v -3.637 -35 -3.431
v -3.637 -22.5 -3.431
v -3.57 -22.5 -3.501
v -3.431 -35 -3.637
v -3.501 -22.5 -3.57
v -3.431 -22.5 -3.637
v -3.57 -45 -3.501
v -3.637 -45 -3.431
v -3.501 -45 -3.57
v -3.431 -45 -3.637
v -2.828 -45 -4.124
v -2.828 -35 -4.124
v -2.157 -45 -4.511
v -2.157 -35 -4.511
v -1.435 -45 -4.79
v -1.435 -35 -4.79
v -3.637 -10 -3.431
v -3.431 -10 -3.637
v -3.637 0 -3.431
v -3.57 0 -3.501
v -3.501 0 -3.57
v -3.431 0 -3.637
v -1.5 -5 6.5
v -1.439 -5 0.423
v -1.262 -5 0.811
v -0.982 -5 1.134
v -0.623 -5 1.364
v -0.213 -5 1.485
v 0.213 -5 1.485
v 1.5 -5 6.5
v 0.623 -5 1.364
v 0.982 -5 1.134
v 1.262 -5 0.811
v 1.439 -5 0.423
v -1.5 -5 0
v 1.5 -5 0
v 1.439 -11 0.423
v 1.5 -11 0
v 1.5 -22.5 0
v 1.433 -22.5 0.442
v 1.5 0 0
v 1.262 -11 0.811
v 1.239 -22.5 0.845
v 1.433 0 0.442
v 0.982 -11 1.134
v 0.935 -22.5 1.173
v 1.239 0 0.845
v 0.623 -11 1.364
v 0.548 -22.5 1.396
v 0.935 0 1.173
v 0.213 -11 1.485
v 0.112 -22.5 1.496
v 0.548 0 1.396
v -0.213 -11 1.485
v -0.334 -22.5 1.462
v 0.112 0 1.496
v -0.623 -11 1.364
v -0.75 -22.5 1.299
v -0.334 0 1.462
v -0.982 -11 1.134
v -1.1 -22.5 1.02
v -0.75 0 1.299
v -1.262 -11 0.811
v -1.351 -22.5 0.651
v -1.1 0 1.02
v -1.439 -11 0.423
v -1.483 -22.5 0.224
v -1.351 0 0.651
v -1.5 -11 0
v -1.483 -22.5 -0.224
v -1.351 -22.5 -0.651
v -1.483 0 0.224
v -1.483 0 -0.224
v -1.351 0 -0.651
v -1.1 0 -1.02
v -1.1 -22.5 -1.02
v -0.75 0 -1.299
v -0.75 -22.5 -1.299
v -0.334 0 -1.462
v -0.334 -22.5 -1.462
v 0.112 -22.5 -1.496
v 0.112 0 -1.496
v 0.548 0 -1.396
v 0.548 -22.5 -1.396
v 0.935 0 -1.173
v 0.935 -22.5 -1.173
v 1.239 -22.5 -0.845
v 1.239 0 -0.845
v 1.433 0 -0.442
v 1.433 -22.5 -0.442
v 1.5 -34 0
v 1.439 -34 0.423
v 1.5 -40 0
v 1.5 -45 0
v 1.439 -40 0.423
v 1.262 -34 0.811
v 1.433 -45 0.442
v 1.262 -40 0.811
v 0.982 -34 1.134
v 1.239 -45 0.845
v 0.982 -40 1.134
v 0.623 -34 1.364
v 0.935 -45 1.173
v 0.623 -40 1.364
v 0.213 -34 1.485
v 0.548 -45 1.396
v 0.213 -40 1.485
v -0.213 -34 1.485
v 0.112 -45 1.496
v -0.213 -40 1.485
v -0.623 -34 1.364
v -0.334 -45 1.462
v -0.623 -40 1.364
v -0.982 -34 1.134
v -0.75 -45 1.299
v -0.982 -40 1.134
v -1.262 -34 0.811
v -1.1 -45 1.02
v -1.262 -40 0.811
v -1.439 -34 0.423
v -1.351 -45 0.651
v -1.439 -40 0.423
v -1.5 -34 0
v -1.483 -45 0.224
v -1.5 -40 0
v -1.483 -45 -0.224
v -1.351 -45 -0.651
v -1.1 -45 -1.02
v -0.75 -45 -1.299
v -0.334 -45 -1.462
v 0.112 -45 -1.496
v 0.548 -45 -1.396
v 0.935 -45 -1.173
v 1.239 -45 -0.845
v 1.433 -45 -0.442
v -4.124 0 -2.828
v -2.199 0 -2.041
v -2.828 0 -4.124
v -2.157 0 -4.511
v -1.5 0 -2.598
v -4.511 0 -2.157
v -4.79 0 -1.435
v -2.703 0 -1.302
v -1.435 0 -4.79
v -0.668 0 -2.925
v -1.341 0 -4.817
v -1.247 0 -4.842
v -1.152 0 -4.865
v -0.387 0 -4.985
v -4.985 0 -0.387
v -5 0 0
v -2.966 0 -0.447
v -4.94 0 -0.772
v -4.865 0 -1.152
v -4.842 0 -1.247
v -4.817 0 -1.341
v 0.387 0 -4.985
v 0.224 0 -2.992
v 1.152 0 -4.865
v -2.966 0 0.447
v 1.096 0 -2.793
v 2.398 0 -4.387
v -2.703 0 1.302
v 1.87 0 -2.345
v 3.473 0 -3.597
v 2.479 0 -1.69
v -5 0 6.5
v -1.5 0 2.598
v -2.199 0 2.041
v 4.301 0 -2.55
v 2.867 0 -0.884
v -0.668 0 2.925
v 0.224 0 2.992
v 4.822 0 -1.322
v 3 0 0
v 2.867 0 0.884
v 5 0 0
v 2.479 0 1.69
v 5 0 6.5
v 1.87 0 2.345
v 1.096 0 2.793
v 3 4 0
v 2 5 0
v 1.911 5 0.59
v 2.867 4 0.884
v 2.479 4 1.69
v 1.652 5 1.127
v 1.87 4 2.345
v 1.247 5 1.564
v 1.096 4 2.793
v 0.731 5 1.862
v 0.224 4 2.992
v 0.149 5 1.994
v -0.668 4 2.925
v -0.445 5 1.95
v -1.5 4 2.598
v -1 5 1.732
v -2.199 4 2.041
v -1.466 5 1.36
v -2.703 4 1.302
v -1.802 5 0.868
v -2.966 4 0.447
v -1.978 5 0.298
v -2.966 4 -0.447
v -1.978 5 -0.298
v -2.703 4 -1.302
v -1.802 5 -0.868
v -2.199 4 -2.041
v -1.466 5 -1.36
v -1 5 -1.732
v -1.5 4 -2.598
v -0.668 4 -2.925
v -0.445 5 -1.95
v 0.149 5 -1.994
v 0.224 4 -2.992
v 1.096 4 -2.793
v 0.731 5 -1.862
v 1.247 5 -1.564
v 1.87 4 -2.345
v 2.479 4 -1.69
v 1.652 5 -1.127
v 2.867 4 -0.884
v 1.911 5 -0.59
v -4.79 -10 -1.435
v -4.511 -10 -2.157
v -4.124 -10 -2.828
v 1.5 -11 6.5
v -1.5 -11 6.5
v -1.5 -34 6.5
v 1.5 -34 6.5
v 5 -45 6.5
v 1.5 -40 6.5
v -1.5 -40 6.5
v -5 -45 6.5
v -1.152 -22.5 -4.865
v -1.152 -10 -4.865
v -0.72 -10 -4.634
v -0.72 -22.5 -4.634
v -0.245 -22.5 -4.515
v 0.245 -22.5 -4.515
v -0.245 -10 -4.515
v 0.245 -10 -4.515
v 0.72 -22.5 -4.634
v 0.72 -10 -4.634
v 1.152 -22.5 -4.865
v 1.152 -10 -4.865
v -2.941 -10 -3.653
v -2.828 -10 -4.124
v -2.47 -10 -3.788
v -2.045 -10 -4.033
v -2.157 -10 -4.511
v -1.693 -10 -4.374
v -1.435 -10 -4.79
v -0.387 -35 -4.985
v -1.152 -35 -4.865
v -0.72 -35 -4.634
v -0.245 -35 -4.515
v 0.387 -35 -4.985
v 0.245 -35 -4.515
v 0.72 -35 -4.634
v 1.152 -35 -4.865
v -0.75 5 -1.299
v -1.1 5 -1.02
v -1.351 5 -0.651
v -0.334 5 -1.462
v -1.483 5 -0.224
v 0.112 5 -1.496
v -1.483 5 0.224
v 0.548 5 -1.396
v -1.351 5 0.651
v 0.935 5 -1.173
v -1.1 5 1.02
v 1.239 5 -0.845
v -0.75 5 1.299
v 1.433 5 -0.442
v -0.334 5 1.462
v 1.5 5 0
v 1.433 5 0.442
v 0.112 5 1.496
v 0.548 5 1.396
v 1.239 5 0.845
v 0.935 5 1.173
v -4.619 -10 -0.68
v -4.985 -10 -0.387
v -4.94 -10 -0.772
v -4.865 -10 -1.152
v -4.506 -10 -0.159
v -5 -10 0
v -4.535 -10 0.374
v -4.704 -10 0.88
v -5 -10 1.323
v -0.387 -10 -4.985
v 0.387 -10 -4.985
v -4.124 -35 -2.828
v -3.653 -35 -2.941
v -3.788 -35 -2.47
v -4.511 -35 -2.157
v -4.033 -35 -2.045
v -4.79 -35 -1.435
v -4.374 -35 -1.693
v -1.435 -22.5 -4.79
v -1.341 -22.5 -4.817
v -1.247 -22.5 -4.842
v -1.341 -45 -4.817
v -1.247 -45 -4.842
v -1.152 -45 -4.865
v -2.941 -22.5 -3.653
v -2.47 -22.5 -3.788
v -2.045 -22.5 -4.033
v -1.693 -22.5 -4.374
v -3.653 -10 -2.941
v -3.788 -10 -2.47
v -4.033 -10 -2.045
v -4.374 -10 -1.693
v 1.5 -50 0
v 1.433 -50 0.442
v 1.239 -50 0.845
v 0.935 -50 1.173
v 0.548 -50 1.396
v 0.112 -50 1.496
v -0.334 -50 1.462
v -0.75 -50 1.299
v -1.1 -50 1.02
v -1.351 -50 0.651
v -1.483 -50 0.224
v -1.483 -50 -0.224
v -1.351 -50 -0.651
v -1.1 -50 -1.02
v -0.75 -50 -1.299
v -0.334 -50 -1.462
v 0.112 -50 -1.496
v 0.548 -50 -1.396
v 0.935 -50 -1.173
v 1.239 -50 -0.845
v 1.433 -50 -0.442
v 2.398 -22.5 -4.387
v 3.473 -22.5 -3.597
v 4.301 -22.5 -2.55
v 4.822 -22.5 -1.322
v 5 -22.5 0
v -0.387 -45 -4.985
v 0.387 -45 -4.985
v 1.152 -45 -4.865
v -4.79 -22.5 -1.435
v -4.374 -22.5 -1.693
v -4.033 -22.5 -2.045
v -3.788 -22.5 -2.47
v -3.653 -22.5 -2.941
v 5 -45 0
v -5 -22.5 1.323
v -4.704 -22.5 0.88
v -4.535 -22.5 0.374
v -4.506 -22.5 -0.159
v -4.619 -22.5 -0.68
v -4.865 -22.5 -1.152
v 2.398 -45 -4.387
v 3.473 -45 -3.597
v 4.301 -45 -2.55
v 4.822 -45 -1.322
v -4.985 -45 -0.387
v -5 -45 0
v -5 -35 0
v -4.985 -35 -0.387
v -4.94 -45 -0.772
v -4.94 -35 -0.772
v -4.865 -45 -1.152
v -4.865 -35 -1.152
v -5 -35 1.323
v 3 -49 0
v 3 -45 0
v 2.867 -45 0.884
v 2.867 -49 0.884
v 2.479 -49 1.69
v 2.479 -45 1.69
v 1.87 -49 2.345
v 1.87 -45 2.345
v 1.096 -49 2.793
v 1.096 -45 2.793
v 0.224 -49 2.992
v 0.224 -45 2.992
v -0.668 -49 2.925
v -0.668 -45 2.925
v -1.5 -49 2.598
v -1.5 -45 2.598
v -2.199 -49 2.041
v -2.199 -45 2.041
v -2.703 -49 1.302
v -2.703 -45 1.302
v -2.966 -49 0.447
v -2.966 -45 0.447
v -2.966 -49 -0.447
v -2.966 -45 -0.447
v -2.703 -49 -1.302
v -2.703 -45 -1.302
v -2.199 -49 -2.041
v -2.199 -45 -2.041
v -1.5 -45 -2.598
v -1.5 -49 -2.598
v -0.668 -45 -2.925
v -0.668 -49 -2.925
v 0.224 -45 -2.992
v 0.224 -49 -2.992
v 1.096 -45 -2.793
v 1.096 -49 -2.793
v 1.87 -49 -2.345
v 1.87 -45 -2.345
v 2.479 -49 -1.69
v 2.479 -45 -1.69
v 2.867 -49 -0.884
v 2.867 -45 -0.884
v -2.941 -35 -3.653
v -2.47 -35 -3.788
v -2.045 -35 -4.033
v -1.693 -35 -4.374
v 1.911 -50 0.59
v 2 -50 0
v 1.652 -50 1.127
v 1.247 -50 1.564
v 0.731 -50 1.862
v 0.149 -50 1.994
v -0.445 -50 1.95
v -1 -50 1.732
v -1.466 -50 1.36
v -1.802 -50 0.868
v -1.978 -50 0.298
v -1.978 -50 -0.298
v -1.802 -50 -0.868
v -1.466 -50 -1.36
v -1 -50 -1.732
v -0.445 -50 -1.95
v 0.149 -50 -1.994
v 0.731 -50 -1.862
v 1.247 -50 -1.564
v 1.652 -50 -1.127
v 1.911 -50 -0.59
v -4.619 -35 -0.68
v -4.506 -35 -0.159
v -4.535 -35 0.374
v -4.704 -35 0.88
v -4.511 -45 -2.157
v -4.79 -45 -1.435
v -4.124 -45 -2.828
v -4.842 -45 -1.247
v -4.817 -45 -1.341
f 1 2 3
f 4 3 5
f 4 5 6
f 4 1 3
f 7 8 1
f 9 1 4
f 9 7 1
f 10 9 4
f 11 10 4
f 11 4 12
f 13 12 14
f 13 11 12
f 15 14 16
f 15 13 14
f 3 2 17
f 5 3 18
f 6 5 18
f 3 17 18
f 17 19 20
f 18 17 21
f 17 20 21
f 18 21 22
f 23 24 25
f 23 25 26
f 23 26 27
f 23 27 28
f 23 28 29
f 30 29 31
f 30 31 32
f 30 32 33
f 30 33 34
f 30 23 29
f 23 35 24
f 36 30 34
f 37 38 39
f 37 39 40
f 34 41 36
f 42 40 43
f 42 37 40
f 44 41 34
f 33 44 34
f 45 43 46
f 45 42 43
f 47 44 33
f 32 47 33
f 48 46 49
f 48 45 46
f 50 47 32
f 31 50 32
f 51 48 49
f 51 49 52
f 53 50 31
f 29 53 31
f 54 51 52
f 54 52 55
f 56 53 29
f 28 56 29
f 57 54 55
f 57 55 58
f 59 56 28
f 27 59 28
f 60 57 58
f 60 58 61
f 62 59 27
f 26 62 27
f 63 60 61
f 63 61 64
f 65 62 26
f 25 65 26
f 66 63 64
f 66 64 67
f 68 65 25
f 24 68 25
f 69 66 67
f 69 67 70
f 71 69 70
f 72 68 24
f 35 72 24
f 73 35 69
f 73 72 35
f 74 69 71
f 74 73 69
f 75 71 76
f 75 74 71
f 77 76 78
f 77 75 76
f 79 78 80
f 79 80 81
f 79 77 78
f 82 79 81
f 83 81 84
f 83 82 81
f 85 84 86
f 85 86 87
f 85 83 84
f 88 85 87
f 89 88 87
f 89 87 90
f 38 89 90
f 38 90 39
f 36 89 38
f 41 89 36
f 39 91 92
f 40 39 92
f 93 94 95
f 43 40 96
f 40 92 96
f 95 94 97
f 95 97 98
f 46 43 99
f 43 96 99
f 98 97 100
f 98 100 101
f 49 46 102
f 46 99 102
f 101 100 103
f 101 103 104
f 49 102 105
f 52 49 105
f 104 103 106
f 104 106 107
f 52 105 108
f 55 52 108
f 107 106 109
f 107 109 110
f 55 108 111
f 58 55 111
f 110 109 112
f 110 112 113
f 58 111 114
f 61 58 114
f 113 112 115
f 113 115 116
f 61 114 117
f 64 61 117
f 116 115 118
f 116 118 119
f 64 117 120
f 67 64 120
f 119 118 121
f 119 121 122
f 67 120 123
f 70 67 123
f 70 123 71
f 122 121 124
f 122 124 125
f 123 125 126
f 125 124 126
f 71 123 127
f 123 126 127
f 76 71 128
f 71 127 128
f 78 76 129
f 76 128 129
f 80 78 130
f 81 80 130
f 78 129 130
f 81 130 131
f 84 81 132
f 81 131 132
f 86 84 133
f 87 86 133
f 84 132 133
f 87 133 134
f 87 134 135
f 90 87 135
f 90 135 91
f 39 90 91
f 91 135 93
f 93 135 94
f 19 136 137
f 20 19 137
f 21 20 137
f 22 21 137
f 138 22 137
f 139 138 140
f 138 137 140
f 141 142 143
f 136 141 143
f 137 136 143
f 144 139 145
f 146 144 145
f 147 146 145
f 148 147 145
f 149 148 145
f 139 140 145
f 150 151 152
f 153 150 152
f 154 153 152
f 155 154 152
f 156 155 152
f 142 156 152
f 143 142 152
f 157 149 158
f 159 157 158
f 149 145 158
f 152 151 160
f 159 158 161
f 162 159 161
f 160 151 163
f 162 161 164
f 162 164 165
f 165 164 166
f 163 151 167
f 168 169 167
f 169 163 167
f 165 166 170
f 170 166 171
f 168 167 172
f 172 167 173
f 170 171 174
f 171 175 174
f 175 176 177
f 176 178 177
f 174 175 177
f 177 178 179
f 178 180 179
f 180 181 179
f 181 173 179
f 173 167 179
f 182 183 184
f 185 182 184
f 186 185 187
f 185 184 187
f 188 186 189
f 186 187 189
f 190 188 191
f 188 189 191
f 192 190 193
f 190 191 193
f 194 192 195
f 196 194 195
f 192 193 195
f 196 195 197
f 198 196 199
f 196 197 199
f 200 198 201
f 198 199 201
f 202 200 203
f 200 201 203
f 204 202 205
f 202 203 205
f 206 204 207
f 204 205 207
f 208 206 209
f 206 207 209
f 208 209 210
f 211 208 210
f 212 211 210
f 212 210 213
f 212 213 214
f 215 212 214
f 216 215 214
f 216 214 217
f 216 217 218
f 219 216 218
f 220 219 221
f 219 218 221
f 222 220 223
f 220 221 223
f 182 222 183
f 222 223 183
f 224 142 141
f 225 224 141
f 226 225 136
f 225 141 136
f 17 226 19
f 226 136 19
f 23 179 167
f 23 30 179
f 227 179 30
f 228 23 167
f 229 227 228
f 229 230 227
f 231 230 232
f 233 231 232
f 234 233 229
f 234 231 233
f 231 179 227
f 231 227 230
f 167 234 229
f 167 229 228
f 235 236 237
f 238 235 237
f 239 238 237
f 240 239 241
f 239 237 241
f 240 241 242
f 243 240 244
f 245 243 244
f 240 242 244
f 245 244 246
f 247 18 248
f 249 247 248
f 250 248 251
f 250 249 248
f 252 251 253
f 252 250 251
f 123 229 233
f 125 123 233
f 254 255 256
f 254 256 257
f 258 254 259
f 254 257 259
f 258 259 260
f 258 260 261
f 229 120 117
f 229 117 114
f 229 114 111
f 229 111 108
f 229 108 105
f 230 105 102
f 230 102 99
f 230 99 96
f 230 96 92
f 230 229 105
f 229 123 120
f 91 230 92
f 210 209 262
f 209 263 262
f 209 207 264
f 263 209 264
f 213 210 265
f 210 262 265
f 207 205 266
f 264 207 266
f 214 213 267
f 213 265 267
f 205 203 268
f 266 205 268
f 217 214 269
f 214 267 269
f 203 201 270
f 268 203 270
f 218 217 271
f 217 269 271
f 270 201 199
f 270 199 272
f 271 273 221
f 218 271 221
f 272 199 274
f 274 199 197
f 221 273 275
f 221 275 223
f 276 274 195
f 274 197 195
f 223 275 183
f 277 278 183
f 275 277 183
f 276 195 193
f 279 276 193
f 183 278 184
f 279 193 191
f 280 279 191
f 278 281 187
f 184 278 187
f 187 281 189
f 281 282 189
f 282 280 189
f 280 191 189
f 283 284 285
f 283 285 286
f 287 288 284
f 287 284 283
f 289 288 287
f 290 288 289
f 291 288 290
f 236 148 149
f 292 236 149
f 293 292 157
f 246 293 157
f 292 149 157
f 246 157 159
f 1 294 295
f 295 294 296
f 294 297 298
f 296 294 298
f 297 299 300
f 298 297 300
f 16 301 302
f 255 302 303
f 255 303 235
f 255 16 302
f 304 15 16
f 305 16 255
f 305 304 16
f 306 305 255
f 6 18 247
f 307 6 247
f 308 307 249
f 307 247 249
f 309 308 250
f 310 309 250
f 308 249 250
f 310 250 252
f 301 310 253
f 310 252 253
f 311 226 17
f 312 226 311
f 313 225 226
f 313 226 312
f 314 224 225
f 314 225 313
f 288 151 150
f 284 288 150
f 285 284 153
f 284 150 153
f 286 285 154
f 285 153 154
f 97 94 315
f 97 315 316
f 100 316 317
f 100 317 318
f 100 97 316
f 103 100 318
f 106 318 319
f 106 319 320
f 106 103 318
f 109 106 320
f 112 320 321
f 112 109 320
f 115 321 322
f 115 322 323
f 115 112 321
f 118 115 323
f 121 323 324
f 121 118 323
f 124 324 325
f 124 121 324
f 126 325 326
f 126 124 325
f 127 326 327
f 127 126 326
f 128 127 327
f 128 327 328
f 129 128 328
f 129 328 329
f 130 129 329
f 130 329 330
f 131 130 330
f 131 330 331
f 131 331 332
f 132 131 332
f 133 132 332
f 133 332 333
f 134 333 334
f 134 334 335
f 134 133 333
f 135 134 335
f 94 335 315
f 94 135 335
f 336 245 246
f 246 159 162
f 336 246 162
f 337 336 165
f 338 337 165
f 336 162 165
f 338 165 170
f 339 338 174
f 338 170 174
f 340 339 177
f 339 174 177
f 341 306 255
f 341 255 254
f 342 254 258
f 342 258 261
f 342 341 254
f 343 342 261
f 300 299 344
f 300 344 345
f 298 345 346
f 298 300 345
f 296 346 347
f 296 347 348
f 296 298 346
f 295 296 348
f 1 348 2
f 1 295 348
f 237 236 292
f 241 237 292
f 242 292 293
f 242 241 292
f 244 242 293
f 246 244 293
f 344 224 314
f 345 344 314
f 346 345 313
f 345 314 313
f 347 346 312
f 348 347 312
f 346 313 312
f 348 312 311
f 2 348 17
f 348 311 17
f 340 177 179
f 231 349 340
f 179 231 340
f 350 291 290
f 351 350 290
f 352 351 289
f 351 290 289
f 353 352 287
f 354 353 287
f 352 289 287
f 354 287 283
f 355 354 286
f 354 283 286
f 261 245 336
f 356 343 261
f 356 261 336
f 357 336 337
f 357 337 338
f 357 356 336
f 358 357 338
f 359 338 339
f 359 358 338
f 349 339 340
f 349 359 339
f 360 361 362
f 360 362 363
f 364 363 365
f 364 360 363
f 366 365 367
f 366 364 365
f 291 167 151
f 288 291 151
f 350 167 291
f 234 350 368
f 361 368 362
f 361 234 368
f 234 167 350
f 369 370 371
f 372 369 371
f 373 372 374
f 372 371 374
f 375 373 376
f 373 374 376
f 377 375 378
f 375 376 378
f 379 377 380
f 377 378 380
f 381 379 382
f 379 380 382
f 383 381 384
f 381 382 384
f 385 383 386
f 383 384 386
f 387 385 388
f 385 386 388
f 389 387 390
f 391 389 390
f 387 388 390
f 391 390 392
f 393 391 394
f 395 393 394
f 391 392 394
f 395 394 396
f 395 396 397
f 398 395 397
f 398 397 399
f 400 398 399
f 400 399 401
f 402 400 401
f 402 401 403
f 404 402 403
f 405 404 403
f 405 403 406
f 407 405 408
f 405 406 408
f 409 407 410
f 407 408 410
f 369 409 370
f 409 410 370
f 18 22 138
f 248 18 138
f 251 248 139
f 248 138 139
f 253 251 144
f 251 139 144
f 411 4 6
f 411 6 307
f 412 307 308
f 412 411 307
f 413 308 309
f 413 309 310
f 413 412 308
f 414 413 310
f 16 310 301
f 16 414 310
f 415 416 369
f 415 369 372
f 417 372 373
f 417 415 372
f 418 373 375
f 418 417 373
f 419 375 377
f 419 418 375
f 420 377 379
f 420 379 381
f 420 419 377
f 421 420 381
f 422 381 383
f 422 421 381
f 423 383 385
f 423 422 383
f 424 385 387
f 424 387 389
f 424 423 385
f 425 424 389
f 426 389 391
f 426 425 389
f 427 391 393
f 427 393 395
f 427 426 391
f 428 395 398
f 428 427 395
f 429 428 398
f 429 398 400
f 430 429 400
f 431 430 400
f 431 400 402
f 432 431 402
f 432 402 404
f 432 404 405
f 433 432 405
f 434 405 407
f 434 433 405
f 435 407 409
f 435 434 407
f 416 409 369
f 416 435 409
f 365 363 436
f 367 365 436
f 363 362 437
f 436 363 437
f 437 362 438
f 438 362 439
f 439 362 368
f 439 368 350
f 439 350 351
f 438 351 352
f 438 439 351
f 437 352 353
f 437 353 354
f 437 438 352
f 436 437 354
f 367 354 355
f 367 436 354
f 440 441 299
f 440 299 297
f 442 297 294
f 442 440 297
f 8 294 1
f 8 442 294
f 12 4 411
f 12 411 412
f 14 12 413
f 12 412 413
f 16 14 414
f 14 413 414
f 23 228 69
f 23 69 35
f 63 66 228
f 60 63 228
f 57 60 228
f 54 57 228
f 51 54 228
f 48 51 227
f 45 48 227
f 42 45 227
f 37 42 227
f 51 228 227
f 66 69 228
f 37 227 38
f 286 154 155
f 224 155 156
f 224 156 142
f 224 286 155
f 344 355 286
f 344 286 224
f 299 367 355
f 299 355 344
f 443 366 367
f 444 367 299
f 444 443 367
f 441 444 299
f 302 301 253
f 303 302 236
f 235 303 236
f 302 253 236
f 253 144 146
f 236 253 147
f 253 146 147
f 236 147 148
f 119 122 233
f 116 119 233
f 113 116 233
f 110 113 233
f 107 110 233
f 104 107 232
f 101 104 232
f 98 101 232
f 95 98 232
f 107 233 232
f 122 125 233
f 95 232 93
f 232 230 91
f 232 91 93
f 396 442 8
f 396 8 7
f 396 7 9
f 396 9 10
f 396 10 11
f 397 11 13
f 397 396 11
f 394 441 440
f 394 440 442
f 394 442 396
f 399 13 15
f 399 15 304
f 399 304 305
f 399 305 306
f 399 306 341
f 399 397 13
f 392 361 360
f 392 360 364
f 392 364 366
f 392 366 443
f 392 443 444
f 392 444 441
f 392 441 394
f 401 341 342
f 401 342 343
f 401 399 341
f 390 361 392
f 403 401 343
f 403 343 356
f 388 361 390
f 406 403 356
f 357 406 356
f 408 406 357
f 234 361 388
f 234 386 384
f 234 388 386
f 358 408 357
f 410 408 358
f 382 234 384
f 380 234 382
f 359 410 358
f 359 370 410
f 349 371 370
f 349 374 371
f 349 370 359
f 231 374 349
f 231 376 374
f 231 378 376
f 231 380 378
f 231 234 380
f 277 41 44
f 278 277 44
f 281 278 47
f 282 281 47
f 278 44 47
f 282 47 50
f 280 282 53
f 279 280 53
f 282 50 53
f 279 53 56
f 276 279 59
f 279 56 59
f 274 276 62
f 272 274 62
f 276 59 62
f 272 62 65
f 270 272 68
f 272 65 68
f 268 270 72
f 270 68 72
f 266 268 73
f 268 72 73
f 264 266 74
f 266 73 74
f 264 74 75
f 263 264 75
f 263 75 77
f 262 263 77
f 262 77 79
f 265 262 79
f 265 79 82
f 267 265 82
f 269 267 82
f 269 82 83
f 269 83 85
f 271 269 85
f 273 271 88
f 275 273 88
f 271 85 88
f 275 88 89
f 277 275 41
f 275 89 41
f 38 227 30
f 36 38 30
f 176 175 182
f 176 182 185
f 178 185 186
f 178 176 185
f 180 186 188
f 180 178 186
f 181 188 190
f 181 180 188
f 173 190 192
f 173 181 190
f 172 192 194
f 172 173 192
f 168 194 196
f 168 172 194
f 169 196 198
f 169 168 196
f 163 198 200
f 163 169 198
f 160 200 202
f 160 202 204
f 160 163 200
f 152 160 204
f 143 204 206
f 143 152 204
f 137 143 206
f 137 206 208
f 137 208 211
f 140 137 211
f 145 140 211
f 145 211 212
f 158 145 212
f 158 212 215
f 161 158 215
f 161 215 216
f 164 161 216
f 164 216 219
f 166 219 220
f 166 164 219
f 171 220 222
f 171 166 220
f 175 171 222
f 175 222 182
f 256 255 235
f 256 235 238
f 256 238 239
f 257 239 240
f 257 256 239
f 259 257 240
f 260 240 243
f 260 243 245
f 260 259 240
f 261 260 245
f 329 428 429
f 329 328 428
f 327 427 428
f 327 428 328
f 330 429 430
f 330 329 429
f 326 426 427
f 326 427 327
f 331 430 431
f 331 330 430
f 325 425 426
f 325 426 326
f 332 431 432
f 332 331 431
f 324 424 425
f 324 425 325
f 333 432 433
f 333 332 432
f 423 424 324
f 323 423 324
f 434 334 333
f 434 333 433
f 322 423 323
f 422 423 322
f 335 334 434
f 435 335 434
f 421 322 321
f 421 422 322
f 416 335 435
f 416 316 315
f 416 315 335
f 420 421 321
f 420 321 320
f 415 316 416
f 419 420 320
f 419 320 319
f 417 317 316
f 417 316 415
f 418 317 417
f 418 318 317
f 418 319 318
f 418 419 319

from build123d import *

# Parameters (mm, degrees)
F0_R     = 3
F0_R_2   = 1.5
F1_DEPTH = 22.5
F2_DEPTH = 10
F3_R     = 3
F3_R_2   = 1.5
F4_DEPTH = 5
F5_SIZE  = 1
F6_W     = 3
F6_H     = 6
F7_DEPTH = 6.5


with BuildPart() as f1:
    # F0 (on Front) → F1 (new body)
    with BuildSketch(Plane.XZ):
        with BuildLine():
            Line((5, 0), (5, 6.5))
            Line((5, 6.5), (-5, 6.5))
            Line((-5, 6.5), (-5, 1.3228756555))
            ThreePointArc((-5, 1.3228756555), (-4.5029510677, 0.1086073746), (-4.8653846154, -1.1524029436))
            ThreePointArc((-4.8653846154, -1.1524029436), (-4.8296291314, -1.2940952255), (-4.7897481479, -1.4346820832))
            ThreePointArc((-4.7897481479, -1.4346820832), (-3.897114317, -2.25), (-3.6373452043, -3.4307025322))
            ThreePointArc((-3.6373452043, -3.4307025322), (-3.5355339059, -3.5355339059), (-3.4307025322, -3.6373452043))
            ThreePointArc((-3.4307025322, -3.6373452043), (-2.25, -3.897114317), (-1.4346820832, -4.7897481479))
            ThreePointArc((-1.4346820832, -4.7897481479), (-1.2940952255, -4.8296291314), (-1.1524029436, -4.8653846154))
            ThreePointArc((-1.1524029436, -4.8653846154), (0, -4.5), (1.1524029436, -4.8653846154))
            ThreePointArc((1.1524029436, -4.8653846154), (3.921862741, -3.1014500868), (5, 0))
        make_face()
        Circle(F0_R, mode=Mode.SUBTRACT)
        Circle(F0_R)
        Circle(F0_R_2, mode=Mode.SUBTRACT)
    extrude(amount=F1_DEPTH)

    # F0 (on Front) → F2 (join)
    with BuildSketch(Plane.XZ):
        with BuildLine():
            ThreePointArc((-4.8653846154, -1.1524029436), (-4.5029510677, 0.1086073746), (-5, 1.3228756555))
            Line((-5, 1.3228756555), (-5, 0))
            ThreePointArc((-5, 0), (-4.9662321269, -0.5801193511), (-4.8653846154, -1.1524029436))
        make_face()
        with BuildLine():
            ThreePointArc((-3.6373452043, -3.4307025322), (-3.897114317, -2.25), (-4.7897481479, -1.4346820832))
            ThreePointArc((-4.7897481479, -1.4346820832), (-4.3301270189, -2.5), (-3.6373452043, -3.4307025322))
        make_face()
        with BuildLine():
            ThreePointArc((-3.4307025322, -3.6373452043), (-2.5, -4.3301270189), (-1.4346820832, -4.7897481479))
            ThreePointArc((-1.4346820832, -4.7897481479), (-2.25, -3.897114317), (-3.4307025322, -3.6373452043))
        make_face()
        with BuildLine():
            ThreePointArc((-1.1524029436, -4.8653846154), (0, -5), (1.1524029436, -4.8653846154))
            ThreePointArc((1.1524029436, -4.8653846154), (0, -4.5), (-1.1524029436, -4.8653846154))
        make_face()
    extrude(amount=F2_DEPTH)

    # F3 (on face) → F4 (join)
    with BuildSketch(Plane.XZ):
        Circle(F3_R)
        Circle(F3_R_2, mode=Mode.SUBTRACT)
    extrude(amount=-F4_DEPTH)

    # F5
    f5_edges = [f1.edges().sort_by_distance(p)[0] for p in [
        (-3, 5, 0),
    ]]
    chamfer(f5_edges, length=F5_SIZE)

    # F6 (on face) → F7 (cut, through all)
    with BuildSketch(Plane.XY.offset(6.5)):
        with Locations((0, -8)):
            Rectangle(F6_W, F6_H)
    extrude(amount=-F7_DEPTH, mode=Mode.SUBTRACT)

    # F8: F1 across face


with BuildPart() as f1_1:
    add(f1.part)
    add(f1.part.mirror(Plane(origin=(0.0969972457, -22.5, 1.4535836906), x_dir=(1, 0, 0), z_dir=(0, -1, 0))))


solid = f1_1.part
